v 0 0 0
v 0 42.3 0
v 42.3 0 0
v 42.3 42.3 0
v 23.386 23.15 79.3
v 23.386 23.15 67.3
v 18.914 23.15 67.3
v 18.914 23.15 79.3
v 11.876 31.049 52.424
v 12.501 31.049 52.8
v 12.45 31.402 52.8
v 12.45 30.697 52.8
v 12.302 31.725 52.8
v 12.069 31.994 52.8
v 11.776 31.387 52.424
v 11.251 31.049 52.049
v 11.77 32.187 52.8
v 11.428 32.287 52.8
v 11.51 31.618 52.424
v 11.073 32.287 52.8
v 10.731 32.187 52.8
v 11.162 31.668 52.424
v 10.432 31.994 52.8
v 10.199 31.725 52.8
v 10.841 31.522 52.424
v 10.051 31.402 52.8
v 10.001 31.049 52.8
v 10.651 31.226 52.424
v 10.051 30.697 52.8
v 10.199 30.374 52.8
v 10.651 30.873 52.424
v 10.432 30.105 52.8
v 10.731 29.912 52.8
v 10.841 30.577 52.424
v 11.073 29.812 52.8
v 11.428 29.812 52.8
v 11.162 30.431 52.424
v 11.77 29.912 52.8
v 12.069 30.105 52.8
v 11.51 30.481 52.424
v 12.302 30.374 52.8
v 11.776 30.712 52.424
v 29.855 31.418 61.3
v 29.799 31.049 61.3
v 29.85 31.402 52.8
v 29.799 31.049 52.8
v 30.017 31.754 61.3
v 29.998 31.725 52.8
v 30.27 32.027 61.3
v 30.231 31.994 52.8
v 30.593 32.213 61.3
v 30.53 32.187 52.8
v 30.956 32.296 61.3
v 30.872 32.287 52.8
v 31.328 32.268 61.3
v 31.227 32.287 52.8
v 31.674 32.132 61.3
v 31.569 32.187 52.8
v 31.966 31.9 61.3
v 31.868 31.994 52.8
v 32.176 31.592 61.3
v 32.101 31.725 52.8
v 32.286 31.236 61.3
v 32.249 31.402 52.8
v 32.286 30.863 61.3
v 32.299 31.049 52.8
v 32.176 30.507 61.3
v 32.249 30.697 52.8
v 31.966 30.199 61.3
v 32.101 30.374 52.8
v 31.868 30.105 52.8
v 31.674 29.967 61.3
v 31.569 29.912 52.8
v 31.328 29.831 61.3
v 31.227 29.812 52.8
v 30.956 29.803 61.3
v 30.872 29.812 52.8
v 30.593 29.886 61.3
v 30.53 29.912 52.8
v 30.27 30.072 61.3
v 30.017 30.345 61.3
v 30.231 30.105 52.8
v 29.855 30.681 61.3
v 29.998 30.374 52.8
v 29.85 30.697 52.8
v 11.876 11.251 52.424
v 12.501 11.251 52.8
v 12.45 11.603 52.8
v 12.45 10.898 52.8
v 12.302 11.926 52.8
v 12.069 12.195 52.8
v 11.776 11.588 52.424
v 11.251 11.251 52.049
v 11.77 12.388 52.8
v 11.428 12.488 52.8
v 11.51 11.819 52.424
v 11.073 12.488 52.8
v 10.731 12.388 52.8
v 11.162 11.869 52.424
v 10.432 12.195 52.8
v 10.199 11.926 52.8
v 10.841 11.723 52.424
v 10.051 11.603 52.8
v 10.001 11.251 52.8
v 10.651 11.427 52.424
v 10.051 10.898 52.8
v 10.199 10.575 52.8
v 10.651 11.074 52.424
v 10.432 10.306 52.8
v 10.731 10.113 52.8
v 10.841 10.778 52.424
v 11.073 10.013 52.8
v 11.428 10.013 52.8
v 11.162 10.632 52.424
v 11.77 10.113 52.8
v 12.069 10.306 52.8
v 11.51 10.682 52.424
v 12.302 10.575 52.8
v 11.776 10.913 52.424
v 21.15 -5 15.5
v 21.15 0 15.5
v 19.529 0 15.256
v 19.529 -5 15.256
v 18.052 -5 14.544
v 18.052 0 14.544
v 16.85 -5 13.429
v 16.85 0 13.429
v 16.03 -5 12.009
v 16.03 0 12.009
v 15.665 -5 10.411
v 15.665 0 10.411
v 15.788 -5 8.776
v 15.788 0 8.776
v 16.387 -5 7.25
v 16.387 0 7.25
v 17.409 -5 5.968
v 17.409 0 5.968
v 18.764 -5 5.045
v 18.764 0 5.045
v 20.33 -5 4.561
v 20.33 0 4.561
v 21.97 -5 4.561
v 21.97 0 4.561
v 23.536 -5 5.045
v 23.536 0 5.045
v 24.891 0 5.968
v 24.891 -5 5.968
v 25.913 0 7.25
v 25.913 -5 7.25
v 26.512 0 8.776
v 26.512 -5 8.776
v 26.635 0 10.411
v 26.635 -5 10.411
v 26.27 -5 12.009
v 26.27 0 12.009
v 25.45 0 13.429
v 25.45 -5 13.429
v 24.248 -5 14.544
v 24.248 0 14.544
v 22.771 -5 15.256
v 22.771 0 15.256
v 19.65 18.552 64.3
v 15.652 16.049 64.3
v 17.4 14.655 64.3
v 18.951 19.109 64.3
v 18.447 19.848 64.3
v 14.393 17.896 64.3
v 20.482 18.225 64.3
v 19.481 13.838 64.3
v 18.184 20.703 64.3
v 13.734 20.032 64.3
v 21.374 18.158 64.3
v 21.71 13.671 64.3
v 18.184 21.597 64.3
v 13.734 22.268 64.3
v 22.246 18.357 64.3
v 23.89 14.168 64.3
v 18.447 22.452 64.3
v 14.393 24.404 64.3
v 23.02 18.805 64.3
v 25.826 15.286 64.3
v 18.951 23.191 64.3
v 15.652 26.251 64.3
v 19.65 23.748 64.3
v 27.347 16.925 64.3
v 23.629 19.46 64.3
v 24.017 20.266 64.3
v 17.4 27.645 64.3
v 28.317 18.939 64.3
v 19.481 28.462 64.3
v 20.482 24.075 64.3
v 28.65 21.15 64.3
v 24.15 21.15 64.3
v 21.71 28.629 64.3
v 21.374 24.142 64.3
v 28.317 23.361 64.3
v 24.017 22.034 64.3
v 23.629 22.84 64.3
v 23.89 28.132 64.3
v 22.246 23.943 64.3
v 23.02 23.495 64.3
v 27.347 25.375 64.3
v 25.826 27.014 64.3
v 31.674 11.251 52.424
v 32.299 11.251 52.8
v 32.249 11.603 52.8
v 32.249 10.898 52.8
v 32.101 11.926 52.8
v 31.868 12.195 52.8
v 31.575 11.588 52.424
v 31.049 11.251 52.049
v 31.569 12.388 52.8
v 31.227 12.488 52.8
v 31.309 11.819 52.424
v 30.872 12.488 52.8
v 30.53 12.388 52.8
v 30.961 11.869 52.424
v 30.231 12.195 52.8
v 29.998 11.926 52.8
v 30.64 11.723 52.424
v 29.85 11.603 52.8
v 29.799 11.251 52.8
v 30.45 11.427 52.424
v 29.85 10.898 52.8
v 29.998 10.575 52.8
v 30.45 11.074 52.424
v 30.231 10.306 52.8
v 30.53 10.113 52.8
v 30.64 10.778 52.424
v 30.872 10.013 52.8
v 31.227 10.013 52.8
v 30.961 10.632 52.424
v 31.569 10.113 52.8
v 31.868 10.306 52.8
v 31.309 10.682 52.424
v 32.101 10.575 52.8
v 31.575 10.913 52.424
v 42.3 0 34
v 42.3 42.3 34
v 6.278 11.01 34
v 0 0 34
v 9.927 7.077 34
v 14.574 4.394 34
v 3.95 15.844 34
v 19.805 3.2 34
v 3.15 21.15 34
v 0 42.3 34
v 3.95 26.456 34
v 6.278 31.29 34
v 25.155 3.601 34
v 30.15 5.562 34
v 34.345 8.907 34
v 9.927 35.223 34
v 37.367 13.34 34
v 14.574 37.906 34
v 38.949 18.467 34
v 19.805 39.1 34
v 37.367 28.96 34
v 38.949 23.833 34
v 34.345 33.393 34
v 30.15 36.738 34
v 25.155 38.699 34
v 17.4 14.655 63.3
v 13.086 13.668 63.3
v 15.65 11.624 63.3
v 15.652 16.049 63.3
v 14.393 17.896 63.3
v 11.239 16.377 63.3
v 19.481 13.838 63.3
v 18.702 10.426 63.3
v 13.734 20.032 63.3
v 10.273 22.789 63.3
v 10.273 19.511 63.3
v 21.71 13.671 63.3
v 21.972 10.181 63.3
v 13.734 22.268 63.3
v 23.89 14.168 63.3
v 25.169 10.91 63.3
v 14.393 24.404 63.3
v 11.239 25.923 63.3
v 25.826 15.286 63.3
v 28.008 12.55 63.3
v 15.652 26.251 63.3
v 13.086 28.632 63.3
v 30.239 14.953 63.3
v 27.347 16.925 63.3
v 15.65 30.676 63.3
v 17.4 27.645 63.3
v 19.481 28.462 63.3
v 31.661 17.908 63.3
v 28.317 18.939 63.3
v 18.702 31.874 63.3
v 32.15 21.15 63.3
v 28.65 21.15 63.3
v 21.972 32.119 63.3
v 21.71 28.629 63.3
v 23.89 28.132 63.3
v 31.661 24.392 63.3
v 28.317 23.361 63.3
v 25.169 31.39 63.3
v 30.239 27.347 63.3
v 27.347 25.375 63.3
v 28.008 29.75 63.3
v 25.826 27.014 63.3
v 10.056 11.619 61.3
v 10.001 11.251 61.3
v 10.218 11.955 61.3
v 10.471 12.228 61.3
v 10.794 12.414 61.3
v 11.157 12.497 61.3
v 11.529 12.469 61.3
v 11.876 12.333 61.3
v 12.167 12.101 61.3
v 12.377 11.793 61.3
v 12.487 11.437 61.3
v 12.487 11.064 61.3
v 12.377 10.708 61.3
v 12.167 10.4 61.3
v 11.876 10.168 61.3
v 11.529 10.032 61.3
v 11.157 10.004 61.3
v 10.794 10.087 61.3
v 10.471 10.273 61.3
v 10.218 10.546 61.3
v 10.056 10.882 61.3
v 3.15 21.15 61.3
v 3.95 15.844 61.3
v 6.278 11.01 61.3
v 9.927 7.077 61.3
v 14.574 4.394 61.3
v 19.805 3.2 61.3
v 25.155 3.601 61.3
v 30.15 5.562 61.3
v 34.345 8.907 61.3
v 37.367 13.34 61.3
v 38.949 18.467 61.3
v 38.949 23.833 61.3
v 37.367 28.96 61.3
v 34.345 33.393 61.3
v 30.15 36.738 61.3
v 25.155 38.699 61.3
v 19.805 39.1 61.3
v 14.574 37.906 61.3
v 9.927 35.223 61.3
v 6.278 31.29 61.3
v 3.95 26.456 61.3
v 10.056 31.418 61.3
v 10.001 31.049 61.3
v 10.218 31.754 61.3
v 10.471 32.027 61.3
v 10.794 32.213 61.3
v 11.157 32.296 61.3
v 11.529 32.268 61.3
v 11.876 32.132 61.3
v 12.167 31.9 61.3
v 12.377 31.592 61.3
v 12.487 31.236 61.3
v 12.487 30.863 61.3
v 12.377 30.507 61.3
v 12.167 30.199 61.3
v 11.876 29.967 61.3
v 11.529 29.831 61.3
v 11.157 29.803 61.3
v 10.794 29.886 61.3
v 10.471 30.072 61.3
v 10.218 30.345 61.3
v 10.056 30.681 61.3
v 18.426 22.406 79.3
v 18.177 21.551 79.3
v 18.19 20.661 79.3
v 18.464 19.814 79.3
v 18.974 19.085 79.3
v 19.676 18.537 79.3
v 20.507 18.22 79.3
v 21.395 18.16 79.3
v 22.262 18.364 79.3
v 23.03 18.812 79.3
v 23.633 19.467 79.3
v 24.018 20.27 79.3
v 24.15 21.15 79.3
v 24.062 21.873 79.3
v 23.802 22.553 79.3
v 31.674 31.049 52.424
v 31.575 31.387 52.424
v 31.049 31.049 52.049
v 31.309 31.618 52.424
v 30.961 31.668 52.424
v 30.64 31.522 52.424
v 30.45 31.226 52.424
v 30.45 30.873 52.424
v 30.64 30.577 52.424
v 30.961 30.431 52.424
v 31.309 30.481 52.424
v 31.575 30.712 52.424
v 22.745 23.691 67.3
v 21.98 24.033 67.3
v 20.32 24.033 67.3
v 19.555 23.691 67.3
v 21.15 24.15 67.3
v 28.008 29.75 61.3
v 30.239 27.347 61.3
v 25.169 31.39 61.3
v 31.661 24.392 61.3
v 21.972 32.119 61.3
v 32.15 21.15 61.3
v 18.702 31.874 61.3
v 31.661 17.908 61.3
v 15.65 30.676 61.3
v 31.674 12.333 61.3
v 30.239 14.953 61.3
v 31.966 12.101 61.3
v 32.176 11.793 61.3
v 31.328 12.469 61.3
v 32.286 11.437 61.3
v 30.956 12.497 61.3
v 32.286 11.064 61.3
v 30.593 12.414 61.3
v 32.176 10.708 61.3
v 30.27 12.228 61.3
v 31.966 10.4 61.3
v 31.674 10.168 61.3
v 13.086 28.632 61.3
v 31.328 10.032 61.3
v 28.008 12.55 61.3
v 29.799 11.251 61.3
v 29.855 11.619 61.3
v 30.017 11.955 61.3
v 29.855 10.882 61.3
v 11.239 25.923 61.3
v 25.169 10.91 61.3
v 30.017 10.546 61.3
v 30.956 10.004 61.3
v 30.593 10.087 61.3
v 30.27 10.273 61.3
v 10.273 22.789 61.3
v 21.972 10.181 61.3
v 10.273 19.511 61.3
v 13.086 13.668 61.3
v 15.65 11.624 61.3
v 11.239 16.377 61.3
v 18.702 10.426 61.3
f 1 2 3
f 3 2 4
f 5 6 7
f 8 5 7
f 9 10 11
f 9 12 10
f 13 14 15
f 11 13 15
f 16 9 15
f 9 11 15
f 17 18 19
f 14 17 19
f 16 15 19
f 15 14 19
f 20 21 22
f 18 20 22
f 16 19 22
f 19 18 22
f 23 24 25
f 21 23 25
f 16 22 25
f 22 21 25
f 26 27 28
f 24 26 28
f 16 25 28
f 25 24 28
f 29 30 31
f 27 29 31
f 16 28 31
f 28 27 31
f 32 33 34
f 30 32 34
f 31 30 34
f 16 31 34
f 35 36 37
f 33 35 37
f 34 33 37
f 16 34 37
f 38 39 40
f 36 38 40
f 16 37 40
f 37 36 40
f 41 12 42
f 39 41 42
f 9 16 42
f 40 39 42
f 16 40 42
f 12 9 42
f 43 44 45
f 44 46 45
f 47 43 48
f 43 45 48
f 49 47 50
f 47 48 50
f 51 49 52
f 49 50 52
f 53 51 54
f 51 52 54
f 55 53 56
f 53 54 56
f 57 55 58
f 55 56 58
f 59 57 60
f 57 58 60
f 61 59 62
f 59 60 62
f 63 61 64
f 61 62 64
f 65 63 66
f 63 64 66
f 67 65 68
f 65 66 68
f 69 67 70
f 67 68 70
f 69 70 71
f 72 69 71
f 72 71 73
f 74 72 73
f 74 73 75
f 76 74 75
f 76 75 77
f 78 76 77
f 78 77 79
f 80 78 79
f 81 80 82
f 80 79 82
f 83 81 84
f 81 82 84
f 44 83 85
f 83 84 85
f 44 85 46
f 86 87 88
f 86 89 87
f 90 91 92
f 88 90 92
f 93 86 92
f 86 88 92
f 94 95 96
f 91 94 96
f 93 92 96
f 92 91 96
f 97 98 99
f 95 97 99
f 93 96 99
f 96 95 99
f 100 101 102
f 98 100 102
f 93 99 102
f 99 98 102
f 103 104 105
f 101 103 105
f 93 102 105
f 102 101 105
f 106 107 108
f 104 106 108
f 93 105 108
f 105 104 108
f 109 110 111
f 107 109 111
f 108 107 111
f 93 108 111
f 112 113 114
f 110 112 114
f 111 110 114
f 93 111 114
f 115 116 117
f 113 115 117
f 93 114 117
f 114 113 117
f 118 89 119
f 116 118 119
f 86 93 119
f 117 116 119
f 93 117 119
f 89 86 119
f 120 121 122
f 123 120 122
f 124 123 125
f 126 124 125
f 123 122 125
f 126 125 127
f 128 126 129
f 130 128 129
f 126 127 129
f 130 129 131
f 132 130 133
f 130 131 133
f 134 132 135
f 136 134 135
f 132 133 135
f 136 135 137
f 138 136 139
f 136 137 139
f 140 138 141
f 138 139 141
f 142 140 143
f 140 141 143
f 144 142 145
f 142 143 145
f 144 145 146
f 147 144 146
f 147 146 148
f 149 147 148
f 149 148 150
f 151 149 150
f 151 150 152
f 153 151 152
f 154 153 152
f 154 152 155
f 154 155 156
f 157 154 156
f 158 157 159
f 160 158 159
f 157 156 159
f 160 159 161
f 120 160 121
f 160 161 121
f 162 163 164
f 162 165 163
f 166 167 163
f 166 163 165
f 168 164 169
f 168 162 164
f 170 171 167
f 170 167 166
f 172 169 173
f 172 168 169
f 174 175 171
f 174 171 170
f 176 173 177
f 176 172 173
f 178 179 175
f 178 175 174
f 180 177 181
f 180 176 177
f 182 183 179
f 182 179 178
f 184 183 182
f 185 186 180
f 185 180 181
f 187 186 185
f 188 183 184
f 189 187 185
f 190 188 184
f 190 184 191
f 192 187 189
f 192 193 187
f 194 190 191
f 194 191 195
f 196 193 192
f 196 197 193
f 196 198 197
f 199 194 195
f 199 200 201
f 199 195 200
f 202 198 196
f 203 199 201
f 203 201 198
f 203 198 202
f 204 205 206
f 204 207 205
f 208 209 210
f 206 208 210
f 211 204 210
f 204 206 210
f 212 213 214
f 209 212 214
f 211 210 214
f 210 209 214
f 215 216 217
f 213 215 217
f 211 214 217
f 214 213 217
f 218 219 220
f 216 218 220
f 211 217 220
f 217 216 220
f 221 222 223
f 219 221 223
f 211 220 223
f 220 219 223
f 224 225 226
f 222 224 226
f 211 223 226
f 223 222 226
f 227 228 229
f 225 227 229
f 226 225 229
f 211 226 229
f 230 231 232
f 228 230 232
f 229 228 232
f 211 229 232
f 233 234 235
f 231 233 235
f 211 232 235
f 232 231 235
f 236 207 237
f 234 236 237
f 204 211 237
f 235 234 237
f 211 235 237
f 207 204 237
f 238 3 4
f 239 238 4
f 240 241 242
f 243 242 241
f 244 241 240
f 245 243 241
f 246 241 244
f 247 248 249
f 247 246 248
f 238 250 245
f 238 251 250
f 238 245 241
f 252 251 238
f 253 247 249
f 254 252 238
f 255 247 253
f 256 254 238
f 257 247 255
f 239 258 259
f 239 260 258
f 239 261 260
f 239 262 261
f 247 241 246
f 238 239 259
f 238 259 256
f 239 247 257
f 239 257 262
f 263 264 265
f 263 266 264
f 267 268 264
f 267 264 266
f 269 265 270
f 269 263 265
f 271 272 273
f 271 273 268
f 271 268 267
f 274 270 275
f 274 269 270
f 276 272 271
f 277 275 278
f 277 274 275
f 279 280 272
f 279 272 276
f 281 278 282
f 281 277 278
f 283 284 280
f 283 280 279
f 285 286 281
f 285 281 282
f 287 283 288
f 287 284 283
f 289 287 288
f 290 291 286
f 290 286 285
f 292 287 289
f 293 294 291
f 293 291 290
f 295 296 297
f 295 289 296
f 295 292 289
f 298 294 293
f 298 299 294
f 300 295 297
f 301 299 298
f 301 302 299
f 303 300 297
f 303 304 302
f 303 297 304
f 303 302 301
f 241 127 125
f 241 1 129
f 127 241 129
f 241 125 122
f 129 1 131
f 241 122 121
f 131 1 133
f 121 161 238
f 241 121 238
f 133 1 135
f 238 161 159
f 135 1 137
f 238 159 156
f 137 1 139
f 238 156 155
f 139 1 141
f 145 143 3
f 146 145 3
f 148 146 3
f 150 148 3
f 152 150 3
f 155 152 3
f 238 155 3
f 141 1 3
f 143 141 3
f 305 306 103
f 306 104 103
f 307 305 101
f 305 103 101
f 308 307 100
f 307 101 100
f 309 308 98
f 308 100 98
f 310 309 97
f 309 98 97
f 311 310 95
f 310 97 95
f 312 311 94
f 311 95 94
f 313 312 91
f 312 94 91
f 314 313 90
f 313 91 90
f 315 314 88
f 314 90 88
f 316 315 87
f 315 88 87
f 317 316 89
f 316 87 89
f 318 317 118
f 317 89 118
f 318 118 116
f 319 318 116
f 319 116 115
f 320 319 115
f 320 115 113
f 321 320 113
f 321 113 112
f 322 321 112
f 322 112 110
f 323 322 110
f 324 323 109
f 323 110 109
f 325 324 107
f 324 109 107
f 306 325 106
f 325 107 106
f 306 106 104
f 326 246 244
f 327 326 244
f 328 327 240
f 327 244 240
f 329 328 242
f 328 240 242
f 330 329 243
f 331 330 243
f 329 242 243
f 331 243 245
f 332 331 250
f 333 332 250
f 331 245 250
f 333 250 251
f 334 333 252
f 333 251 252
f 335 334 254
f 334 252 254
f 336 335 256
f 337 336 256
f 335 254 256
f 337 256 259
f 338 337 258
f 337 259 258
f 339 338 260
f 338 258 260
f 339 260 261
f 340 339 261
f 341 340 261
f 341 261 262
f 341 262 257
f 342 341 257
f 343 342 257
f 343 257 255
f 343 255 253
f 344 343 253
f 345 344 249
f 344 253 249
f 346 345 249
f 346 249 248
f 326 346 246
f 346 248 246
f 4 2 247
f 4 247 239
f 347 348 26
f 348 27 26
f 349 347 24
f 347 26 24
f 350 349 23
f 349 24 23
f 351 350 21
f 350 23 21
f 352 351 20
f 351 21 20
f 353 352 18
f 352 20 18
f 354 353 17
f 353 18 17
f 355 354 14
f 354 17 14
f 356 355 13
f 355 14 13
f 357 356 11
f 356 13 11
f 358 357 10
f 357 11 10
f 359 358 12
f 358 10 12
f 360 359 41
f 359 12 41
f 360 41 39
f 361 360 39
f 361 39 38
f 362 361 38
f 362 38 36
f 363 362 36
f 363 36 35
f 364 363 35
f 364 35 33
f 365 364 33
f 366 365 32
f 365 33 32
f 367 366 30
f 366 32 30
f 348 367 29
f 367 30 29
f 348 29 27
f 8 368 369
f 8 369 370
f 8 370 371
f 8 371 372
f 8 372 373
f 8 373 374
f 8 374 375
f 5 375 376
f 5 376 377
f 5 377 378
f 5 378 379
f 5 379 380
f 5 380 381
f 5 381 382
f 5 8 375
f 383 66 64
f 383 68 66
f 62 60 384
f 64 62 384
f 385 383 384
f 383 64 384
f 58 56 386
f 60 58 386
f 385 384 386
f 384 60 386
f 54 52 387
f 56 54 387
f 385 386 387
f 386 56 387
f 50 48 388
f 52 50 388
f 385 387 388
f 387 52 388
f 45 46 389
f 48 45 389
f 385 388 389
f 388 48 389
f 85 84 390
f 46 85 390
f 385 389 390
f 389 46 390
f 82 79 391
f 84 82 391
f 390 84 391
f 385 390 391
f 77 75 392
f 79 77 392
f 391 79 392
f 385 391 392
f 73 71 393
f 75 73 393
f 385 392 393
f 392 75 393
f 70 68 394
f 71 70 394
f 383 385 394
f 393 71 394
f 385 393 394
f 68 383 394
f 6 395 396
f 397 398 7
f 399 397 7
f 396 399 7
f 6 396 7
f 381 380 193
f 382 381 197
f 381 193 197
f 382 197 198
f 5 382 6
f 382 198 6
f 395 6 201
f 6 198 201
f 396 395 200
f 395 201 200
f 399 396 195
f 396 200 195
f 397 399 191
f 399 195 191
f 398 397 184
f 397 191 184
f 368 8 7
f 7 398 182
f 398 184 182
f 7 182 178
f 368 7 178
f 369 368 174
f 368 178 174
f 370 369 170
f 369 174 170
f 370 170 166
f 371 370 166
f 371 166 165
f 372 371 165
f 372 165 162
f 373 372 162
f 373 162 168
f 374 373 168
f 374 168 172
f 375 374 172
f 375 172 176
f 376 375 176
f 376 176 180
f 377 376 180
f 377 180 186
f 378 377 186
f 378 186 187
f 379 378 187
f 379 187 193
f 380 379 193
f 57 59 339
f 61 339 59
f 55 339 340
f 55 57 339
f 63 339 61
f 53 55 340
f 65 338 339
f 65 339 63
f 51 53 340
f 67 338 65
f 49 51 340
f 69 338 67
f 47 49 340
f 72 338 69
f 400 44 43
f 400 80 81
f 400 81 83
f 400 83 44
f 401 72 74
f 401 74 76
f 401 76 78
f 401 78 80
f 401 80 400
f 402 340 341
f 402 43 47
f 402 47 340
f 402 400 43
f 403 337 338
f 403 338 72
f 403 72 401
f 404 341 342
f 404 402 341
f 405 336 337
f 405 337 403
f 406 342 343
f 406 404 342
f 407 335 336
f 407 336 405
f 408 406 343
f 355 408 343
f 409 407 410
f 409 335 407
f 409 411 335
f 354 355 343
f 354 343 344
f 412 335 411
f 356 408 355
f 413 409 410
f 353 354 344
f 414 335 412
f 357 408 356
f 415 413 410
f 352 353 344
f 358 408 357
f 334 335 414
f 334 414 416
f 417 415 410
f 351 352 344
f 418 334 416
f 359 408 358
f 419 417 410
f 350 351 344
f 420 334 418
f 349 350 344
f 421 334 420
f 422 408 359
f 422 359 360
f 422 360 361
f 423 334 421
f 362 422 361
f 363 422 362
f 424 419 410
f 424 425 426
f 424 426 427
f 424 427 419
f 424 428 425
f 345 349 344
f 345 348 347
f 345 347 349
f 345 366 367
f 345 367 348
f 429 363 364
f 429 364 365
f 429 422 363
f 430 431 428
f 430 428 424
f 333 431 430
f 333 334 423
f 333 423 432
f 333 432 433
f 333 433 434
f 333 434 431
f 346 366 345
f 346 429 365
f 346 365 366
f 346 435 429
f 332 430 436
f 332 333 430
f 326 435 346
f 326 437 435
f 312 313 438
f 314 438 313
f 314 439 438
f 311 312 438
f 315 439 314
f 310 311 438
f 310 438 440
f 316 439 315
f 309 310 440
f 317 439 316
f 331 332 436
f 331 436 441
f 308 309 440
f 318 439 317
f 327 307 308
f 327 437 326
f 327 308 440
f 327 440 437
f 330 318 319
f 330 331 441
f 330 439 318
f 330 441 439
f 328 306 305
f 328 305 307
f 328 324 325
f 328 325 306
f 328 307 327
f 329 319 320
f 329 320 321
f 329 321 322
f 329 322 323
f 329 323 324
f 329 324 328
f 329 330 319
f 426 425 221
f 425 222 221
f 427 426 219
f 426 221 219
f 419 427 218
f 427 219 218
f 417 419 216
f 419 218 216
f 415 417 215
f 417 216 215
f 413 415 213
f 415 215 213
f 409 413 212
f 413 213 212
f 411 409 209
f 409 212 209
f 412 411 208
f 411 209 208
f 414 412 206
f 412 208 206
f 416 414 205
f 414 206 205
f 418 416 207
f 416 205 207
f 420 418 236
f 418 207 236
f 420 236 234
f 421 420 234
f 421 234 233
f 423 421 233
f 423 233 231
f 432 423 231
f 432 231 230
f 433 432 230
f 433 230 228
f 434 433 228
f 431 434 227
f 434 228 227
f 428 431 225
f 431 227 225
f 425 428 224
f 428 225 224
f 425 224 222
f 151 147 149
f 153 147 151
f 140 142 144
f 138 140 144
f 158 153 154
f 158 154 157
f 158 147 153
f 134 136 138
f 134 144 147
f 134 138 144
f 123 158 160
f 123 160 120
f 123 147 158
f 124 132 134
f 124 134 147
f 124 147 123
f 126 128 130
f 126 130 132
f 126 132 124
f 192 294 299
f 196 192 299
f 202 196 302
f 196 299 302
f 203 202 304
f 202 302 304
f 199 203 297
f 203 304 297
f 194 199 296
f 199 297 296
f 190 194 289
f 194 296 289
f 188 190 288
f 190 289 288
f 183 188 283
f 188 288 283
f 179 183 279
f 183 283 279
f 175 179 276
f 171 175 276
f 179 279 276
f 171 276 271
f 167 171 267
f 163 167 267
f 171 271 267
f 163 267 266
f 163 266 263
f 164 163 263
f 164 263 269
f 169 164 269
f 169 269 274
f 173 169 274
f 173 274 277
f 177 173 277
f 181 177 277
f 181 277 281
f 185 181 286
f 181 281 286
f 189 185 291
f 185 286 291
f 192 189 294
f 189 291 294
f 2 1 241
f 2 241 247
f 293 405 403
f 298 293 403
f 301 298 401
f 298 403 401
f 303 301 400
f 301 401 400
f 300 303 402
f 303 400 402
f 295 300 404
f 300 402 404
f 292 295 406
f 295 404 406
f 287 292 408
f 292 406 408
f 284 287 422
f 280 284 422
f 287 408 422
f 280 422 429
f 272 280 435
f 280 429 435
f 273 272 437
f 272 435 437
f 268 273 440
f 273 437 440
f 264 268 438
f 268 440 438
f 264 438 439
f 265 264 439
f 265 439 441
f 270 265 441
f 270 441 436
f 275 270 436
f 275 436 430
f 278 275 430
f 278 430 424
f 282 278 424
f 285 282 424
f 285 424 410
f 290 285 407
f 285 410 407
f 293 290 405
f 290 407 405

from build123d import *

# Parameters (mm, degrees)
SKIZZE1_W                       = 42.3
SKIZZE1_H                       = 42.3
AUFSATZ_LINEAR_AUSTRAGEN1_DEPTH = 34
SKIZZE2_R                       = 18
AUFSATZ_LINEAR_AUSTRAGEN2_DEPTH = 27.3
SKIZZE3_R                       = 11
AUFSATZ_LINEAR_AUSTRAGEN3_DEPTH = 2
SKIZZE4_R                       = 7.5
AUFSATZ_LINEAR_AUSTRAGEN4_DEPTH = 1
SKIZZE5_R                       = 3
AUFSATZ_LINEAR_AUSTRAGEN5_DEPTH = 15
SCHNITT_LINEAR_START            = -12
SCHNITT_LINEAR_AUSTRAGEN1_DEPTH = 12
M3_GEWINDEBOHRUNG1_D            = 2.5
M3_GEWINDEBOHRUNG1_DEPTH        = 8.5
M3_GEWINDEBOHRUNG1_TIP          = 0.751075774
SKIZZE9_R                       = 5.5
AUFSATZ_LINEAR_AUSTRAGEN6_DEPTH = 5


with BuildPart() as part:
    # Skizze1 → Aufsatz-Linear austragen1 (new body)
    with BuildSketch(Plane.XY):
        with Locations((21.15, 21.15)):
            Rectangle(SKIZZE1_W, SKIZZE1_H)
    extrude(amount=AUFSATZ_LINEAR_AUSTRAGEN1_DEPTH)

    # Skizze2 → Aufsatz-Linear austragen2 (add)
    with BuildSketch(Plane.XY.offset(34)):
        with Locations(Location((21.15, 21.15, 0), (0, 0, 180))):
            Circle(SKIZZE2_R)
    extrude(amount=AUFSATZ_LINEAR_AUSTRAGEN2_DEPTH)

    # Skizze3 → Aufsatz-Linear austragen3 (add)
    with BuildSketch(Plane.XY.offset(61.3)):
        with Locations((21.15, 21.15)):
            Circle(SKIZZE3_R)
    extrude(amount=AUFSATZ_LINEAR_AUSTRAGEN3_DEPTH)

    # Skizze4 → Aufsatz-Linear austragen4 (add)
    with BuildSketch(Plane.XY.offset(63.3)):
        with Locations((21.15, 21.15)):
            Circle(SKIZZE4_R)
    extrude(amount=AUFSATZ_LINEAR_AUSTRAGEN4_DEPTH)

    # Skizze5 → Aufsatz-Linear austragen5 (add)
    with BuildSketch(Plane.XY.offset(64.3)):
        with Locations((21.15, 21.15)):
            Circle(SKIZZE5_R)
    extrude(amount=AUFSATZ_LINEAR_AUSTRAGEN5_DEPTH)

    # Skizze6 → Schnitt-Linear austragen1 (cut)
    with BuildSketch(Plane.XY.offset(79.3).offset(SCHNITT_LINEAR_START)):
        with BuildLine():
            Line((23.386067977, 23.15), (18.913932023, 23.15))
            ThreePointArc((18.913932023, 23.15), (21.15, 24.15), (23.386067977, 23.15))
        make_face()
    extrude(amount=SCHNITT_LINEAR_AUSTRAGEN1_DEPTH, mode=Mode.SUBTRACT)

    # M3 Gewindebohrung1
    with Locations(Plane.XY.offset(61.3)):
        with Locations((11.250505063, 11.250505063), (31.049494937, 11.250505063), (31.049494937, 31.049494937), (11.250505063, 31.049494937)):
            Hole(M3_GEWINDEBOHRUNG1_D / 2, depth=M3_GEWINDEBOHRUNG1_DEPTH)
            with Locations((0, 0, -(M3_GEWINDEBOHRUNG1_DEPTH + M3_GEWINDEBOHRUNG1_TIP / 2))):  # 118° drill point
                Cone(0, M3_GEWINDEBOHRUNG1_D / 2, M3_GEWINDEBOHRUNG1_TIP, mode=Mode.SUBTRACT)

    # Skizze9 → Aufsatz-Linear austragen6 (add)
    with BuildSketch(Plane(origin=(0, 0, 0), x_dir=(-1, 0, 0), z_dir=(0, -1, 0))):
        with Locations(Location((-21.15, -10, 0), (0, 0, 270))):
            Circle(SKIZZE9_R)
    extrude(amount=AUFSATZ_LINEAR_AUSTRAGEN6_DEPTH)


solid = part.part
